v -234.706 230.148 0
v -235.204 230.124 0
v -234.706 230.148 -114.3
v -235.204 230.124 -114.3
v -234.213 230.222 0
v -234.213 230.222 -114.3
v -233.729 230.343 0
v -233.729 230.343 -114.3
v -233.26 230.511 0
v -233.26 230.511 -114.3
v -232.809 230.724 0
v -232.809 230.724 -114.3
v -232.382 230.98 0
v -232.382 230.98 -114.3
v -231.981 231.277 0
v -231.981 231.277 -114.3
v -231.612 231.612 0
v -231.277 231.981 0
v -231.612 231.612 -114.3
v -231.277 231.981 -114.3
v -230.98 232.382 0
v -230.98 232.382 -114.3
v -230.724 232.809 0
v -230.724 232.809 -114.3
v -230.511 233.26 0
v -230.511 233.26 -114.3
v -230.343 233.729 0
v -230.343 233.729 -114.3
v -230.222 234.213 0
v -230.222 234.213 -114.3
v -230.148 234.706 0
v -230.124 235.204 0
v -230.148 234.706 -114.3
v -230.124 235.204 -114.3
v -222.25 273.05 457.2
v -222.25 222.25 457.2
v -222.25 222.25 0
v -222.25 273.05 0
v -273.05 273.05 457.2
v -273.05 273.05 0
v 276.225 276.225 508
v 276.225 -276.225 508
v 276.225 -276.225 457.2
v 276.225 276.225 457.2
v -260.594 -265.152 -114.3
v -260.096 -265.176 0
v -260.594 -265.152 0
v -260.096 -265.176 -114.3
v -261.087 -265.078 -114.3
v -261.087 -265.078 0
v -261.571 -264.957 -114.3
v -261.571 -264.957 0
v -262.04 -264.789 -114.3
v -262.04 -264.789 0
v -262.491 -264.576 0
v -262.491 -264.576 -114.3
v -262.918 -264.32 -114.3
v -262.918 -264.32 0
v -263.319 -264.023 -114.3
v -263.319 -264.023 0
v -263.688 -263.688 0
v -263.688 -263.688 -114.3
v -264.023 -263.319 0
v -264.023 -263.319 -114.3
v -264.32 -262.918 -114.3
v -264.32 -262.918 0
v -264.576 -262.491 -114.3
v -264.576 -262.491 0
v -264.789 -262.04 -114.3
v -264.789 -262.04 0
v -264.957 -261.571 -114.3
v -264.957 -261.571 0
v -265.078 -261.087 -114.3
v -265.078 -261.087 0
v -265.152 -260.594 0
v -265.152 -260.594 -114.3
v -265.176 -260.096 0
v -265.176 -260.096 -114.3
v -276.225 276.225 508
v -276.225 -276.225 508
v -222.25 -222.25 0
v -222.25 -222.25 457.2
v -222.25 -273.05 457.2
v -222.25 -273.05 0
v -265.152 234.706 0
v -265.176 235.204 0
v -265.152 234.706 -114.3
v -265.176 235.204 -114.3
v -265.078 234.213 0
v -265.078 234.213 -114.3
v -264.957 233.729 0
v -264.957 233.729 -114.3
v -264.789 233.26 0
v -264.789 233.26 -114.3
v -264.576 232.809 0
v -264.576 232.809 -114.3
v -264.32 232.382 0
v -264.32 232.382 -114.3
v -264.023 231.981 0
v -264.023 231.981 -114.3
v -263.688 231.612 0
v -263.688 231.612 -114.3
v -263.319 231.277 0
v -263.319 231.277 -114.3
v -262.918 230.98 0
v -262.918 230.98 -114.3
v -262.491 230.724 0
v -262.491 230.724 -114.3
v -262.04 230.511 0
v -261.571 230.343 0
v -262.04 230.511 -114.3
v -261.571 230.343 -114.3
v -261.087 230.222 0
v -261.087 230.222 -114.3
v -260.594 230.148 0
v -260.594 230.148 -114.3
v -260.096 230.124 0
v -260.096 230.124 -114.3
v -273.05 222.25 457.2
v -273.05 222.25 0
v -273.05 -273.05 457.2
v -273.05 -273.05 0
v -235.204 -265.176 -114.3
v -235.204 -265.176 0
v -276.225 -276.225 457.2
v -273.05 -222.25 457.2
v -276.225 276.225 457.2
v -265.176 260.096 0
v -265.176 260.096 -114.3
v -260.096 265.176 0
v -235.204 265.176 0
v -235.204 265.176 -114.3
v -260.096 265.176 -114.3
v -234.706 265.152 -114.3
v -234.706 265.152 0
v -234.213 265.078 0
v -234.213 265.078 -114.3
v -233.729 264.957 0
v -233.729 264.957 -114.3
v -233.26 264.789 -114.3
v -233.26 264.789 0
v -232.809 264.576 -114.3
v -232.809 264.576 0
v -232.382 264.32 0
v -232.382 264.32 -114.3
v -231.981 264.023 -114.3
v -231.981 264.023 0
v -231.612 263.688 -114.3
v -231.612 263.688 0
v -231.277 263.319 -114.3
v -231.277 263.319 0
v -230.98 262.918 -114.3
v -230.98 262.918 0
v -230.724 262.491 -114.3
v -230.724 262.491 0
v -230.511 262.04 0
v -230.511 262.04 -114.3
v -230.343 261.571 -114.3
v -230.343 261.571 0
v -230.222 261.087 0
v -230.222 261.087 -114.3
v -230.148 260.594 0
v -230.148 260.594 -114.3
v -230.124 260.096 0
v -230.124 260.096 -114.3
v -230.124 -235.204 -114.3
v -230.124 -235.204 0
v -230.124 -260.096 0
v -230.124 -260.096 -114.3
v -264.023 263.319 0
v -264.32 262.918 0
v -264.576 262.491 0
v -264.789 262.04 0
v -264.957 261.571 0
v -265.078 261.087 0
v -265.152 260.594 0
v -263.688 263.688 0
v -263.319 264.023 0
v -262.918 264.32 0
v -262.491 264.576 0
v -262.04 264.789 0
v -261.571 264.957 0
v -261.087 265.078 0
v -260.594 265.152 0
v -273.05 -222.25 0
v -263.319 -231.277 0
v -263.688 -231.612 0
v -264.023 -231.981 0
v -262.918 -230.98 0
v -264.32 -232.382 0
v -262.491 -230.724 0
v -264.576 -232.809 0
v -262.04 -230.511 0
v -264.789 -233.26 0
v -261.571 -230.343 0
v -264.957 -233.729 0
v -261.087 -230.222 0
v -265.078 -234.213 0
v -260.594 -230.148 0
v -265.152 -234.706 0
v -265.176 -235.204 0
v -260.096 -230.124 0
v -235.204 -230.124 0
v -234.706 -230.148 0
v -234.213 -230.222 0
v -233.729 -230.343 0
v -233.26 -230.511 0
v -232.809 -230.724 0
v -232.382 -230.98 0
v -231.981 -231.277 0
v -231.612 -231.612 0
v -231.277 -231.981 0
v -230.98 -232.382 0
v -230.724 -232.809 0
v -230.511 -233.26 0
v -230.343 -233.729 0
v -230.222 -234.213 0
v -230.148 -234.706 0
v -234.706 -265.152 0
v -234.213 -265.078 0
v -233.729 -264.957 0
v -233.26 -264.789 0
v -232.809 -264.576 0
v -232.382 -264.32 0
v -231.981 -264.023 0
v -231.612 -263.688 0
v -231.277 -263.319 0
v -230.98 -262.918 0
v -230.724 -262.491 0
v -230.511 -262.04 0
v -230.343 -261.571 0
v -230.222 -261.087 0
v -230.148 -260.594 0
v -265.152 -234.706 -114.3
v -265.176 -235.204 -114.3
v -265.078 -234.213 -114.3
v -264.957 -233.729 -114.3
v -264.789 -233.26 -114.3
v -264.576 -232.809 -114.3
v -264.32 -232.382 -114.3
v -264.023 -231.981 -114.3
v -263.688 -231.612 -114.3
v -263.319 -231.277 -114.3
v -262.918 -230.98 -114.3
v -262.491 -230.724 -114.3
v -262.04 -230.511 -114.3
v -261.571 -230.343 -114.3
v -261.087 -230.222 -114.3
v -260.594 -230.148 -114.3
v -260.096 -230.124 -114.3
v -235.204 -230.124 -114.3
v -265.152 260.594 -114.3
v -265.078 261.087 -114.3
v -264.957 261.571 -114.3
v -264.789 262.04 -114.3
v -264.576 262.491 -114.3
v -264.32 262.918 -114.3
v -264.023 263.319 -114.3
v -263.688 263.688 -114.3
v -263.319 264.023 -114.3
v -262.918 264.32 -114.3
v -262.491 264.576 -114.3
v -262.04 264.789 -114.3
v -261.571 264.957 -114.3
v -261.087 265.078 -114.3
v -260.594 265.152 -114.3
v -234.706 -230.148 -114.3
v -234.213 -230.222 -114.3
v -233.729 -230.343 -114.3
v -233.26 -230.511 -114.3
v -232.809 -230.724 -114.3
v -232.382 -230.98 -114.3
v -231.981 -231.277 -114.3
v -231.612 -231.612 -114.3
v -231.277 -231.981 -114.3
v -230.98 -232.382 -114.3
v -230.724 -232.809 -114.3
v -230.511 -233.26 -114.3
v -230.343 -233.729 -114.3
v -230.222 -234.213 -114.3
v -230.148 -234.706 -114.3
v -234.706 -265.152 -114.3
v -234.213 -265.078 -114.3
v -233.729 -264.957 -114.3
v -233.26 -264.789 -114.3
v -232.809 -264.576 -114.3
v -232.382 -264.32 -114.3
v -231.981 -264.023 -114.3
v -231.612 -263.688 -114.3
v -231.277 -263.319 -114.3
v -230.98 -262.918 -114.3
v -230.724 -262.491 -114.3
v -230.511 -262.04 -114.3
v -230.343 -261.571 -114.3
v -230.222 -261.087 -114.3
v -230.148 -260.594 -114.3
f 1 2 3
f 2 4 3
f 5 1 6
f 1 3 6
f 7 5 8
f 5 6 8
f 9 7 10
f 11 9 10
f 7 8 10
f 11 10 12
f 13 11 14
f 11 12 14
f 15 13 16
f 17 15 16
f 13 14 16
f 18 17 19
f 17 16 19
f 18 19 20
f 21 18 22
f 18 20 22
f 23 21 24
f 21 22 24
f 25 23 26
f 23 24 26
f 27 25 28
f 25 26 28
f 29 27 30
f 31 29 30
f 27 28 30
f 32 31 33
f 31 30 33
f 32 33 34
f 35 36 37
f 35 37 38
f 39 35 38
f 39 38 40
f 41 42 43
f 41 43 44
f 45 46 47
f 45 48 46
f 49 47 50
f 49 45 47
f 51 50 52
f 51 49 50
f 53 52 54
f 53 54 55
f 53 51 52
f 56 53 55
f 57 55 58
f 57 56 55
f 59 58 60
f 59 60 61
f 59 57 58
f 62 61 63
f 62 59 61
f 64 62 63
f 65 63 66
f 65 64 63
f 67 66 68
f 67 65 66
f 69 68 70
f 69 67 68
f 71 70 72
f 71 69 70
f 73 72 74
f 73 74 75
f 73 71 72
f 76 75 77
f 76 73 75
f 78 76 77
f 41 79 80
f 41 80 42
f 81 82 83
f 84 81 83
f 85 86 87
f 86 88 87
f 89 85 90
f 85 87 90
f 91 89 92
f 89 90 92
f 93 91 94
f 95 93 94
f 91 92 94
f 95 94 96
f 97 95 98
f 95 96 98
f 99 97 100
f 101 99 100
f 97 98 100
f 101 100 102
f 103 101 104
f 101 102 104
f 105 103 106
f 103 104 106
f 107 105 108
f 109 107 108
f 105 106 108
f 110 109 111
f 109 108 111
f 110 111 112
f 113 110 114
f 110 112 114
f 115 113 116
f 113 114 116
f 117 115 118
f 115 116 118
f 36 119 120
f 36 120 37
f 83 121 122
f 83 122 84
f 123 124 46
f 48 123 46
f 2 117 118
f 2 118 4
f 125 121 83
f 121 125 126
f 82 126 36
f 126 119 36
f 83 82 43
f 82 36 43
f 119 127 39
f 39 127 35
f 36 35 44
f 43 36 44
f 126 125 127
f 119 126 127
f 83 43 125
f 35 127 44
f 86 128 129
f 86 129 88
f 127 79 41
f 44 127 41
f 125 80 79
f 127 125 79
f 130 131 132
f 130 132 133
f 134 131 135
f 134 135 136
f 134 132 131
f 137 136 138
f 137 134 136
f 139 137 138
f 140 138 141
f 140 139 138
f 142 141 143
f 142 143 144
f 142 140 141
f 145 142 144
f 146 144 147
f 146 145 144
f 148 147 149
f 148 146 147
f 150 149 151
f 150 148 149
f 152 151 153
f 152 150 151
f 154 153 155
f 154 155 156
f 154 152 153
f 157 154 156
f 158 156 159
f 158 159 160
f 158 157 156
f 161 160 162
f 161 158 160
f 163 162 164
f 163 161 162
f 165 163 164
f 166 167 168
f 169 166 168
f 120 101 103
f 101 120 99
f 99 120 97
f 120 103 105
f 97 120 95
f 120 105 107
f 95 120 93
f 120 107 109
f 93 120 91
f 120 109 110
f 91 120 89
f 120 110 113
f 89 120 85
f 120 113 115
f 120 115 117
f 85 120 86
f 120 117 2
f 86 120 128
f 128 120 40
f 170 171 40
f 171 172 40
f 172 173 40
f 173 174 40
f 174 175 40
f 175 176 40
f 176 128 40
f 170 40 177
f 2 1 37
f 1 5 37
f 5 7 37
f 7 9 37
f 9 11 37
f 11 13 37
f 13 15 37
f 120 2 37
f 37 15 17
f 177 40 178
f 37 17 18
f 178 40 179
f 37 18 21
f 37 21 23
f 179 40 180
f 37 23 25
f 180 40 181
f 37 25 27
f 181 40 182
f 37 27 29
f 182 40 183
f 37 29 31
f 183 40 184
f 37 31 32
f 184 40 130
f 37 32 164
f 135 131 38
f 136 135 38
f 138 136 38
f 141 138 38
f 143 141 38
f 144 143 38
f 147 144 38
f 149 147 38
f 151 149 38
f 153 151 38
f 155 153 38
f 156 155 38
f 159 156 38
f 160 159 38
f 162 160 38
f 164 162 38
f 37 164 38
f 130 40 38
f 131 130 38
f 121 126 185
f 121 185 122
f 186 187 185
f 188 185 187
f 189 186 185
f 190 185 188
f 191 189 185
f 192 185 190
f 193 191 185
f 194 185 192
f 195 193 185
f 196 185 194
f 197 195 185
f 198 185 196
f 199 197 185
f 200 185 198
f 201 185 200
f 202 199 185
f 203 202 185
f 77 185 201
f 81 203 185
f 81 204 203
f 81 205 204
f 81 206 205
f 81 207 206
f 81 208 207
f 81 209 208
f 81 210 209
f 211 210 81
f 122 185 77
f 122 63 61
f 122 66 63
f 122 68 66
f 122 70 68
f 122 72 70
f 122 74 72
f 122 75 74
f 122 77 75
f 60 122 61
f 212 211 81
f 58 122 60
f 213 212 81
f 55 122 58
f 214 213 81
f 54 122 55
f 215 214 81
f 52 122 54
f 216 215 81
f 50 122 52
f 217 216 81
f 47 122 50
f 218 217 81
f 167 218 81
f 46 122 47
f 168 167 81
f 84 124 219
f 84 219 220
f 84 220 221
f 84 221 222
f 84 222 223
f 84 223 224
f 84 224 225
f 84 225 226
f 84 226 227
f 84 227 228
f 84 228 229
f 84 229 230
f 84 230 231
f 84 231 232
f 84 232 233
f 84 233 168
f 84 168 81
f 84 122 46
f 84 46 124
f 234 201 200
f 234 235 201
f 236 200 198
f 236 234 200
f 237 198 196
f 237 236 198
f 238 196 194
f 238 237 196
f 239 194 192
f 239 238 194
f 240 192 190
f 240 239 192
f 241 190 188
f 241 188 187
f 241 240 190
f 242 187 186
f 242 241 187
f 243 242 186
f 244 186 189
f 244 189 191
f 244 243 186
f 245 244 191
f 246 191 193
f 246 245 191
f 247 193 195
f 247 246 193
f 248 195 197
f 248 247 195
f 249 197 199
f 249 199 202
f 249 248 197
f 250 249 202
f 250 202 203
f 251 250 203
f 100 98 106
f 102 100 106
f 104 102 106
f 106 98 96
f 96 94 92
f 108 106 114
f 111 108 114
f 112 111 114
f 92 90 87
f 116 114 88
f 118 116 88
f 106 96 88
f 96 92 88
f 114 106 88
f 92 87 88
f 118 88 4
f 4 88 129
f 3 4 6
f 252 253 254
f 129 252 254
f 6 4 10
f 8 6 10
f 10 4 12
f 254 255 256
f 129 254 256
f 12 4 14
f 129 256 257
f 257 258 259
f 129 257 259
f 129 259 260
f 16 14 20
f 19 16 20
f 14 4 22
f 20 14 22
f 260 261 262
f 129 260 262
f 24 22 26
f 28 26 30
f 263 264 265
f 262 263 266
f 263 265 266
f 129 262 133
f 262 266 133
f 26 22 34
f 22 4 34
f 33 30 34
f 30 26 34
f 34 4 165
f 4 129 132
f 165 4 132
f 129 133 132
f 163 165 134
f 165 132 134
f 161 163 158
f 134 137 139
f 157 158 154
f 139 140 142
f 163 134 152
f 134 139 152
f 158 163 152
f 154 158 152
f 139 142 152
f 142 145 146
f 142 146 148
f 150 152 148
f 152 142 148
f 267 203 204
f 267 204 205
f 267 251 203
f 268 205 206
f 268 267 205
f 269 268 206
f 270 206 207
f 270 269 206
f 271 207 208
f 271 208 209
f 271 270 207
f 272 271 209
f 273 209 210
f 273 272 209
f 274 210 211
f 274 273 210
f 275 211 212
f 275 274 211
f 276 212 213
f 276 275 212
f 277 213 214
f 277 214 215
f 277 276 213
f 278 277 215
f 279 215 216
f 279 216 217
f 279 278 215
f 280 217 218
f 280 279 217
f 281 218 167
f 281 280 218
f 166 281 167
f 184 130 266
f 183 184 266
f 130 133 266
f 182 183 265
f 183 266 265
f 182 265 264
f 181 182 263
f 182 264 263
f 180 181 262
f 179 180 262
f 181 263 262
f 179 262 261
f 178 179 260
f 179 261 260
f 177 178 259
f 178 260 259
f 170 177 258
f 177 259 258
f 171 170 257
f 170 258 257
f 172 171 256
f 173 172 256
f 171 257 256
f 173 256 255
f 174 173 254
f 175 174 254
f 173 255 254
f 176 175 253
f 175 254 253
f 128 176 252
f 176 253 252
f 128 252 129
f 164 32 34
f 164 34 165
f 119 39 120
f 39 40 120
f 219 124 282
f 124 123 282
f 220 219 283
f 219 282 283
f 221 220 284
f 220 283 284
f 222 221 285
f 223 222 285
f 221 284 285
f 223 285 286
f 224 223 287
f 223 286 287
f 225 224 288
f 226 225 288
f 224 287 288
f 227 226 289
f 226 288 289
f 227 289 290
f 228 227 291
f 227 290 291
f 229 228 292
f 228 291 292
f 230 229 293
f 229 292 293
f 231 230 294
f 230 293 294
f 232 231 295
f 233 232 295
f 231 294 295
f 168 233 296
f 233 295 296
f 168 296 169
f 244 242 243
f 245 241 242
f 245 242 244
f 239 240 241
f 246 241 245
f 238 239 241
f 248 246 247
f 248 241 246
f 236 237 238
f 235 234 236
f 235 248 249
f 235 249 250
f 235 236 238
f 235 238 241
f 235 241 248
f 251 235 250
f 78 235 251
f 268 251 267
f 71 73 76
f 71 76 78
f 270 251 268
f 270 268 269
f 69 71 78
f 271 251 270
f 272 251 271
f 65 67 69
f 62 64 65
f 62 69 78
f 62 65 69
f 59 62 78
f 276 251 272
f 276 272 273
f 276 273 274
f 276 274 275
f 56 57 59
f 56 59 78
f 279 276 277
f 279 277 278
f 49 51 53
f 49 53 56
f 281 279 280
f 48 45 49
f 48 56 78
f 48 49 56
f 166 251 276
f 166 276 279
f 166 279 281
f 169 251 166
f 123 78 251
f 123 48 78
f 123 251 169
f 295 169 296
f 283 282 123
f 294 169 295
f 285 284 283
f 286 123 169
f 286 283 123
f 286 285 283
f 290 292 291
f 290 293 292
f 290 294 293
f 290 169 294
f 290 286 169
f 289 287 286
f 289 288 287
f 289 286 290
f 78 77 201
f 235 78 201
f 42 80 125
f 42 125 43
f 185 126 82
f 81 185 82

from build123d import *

# Parameters (mm, degrees)
F1_W      = 50.8
F1_H      = 50.8
F2_DEPTH  = 508
F5_W      = 50.8
F5_H      = 50.8
F6_DEPTH  = 50.8
F8_W      = 552.45
F8_H      = 552.45
F8_W_2    = 546.1
F8_H_2    = 546.1
F9_DEPTH  = 50.8
F10_DEPTH = 457.2
F12_DEPTH = 114.3
F13_R     = 5.08


# Not quite as in the source:
# - a pattern or mirror of a feature is missing from the dataset's text; its kind, count and spacing are read off the source's solid


with BuildPart() as f2:
    # F1 (on Top) → F2 (new body)
    with BuildSketch(Plane.XY):
        with Locations((-247.65, 247.65)):
            Rectangle(F1_W, F1_H)
    extrude(amount=F2_DEPTH)


with BuildPart() as f3_1:
    # F3: instance of F2
    add(f2.part.mirror(Plane.YZ))


with BuildPart() as f4_1:
    # F4: instance of F2
    add(f2.part.mirror(Plane.XZ))


with BuildPart() as f4_2:
    # F4: instance of F3_1
    add(f3_1.part.mirror(Plane.XZ))


with BuildPart() as f2_1:
    add(f2.part)

    add(f3_1.part)  # F6 merges F3_1

    add(f4_1.part)  # F6 merges F4_1

    add(f4_2.part)  # F6 merges F4_2
    # F5 (on face) → F6 (join)
    with BuildSketch(Plane.XY.offset(508)):
        Polygon((-273.05, 222.25), (-273.05, -273.05), (273.05, -273.05), (273.05, 273.05), (-222.25, 273.05), (-222.25, 222.25), align=None)
        with Locations((-247.65, 247.65)):
            Rectangle(F5_W, F5_H)
    extrude(amount=-F6_DEPTH)

    # F7: union 

    # F8 (on face) → F9 (join, through all)
    with BuildSketch(Plane.XY.offset(508)):
        Rectangle(F8_W, F8_H)
        Rectangle(F8_W_2, F8_H_2, mode=Mode.SUBTRACT)
    extrude(amount=-F9_DEPTH)

    # F10 (cut, through all): faces of the model
    f10_faces = [f2_1.faces().sort_by_distance(p)[0] for p in [
        (247.65, -247.65, 0),
        (247.65, 247.65, 0),
    ]]
    extrude(f10_faces, amount=-F10_DEPTH, mode=Mode.SUBTRACT)

    # F11 (on face) → F12 (join)
    with BuildSketch(Plane(origin=(0, 0, 0), x_dir=(1, 0, 0), z_dir=(0, 0, -1))):
        Polygon((-230.124, 265.176), (-265.176, 265.176), (-230.124, 230.124), align=None)
        Polygon((-230.124, 230.124), (-265.176, 265.176), (-265.176, 230.124), align=None)
    f12 = extrude(amount=F12_DEPTH)

    # F12_copies: F12 across plane
    add(f12.mirror(Plane.ZX))

    # F13
    f13_edges = [f2_1.edges().sort_by_distance(p)[0] for p in [
        (-230.124, -265.176, -57.15),
        (-265.176, -265.176, -57.15),
        (-230.124, -230.124, -57.15),
        (-265.176, -230.124, -57.15),
        (-230.124, 265.176, -57.15),
        (-265.176, 265.176, -57.15),
        (-265.176, 230.124, -57.15),
        (-230.124, 230.124, -57.15),
    ]]
    fillet(f13_edges, radius=F13_R)


solid = f2_1.part
